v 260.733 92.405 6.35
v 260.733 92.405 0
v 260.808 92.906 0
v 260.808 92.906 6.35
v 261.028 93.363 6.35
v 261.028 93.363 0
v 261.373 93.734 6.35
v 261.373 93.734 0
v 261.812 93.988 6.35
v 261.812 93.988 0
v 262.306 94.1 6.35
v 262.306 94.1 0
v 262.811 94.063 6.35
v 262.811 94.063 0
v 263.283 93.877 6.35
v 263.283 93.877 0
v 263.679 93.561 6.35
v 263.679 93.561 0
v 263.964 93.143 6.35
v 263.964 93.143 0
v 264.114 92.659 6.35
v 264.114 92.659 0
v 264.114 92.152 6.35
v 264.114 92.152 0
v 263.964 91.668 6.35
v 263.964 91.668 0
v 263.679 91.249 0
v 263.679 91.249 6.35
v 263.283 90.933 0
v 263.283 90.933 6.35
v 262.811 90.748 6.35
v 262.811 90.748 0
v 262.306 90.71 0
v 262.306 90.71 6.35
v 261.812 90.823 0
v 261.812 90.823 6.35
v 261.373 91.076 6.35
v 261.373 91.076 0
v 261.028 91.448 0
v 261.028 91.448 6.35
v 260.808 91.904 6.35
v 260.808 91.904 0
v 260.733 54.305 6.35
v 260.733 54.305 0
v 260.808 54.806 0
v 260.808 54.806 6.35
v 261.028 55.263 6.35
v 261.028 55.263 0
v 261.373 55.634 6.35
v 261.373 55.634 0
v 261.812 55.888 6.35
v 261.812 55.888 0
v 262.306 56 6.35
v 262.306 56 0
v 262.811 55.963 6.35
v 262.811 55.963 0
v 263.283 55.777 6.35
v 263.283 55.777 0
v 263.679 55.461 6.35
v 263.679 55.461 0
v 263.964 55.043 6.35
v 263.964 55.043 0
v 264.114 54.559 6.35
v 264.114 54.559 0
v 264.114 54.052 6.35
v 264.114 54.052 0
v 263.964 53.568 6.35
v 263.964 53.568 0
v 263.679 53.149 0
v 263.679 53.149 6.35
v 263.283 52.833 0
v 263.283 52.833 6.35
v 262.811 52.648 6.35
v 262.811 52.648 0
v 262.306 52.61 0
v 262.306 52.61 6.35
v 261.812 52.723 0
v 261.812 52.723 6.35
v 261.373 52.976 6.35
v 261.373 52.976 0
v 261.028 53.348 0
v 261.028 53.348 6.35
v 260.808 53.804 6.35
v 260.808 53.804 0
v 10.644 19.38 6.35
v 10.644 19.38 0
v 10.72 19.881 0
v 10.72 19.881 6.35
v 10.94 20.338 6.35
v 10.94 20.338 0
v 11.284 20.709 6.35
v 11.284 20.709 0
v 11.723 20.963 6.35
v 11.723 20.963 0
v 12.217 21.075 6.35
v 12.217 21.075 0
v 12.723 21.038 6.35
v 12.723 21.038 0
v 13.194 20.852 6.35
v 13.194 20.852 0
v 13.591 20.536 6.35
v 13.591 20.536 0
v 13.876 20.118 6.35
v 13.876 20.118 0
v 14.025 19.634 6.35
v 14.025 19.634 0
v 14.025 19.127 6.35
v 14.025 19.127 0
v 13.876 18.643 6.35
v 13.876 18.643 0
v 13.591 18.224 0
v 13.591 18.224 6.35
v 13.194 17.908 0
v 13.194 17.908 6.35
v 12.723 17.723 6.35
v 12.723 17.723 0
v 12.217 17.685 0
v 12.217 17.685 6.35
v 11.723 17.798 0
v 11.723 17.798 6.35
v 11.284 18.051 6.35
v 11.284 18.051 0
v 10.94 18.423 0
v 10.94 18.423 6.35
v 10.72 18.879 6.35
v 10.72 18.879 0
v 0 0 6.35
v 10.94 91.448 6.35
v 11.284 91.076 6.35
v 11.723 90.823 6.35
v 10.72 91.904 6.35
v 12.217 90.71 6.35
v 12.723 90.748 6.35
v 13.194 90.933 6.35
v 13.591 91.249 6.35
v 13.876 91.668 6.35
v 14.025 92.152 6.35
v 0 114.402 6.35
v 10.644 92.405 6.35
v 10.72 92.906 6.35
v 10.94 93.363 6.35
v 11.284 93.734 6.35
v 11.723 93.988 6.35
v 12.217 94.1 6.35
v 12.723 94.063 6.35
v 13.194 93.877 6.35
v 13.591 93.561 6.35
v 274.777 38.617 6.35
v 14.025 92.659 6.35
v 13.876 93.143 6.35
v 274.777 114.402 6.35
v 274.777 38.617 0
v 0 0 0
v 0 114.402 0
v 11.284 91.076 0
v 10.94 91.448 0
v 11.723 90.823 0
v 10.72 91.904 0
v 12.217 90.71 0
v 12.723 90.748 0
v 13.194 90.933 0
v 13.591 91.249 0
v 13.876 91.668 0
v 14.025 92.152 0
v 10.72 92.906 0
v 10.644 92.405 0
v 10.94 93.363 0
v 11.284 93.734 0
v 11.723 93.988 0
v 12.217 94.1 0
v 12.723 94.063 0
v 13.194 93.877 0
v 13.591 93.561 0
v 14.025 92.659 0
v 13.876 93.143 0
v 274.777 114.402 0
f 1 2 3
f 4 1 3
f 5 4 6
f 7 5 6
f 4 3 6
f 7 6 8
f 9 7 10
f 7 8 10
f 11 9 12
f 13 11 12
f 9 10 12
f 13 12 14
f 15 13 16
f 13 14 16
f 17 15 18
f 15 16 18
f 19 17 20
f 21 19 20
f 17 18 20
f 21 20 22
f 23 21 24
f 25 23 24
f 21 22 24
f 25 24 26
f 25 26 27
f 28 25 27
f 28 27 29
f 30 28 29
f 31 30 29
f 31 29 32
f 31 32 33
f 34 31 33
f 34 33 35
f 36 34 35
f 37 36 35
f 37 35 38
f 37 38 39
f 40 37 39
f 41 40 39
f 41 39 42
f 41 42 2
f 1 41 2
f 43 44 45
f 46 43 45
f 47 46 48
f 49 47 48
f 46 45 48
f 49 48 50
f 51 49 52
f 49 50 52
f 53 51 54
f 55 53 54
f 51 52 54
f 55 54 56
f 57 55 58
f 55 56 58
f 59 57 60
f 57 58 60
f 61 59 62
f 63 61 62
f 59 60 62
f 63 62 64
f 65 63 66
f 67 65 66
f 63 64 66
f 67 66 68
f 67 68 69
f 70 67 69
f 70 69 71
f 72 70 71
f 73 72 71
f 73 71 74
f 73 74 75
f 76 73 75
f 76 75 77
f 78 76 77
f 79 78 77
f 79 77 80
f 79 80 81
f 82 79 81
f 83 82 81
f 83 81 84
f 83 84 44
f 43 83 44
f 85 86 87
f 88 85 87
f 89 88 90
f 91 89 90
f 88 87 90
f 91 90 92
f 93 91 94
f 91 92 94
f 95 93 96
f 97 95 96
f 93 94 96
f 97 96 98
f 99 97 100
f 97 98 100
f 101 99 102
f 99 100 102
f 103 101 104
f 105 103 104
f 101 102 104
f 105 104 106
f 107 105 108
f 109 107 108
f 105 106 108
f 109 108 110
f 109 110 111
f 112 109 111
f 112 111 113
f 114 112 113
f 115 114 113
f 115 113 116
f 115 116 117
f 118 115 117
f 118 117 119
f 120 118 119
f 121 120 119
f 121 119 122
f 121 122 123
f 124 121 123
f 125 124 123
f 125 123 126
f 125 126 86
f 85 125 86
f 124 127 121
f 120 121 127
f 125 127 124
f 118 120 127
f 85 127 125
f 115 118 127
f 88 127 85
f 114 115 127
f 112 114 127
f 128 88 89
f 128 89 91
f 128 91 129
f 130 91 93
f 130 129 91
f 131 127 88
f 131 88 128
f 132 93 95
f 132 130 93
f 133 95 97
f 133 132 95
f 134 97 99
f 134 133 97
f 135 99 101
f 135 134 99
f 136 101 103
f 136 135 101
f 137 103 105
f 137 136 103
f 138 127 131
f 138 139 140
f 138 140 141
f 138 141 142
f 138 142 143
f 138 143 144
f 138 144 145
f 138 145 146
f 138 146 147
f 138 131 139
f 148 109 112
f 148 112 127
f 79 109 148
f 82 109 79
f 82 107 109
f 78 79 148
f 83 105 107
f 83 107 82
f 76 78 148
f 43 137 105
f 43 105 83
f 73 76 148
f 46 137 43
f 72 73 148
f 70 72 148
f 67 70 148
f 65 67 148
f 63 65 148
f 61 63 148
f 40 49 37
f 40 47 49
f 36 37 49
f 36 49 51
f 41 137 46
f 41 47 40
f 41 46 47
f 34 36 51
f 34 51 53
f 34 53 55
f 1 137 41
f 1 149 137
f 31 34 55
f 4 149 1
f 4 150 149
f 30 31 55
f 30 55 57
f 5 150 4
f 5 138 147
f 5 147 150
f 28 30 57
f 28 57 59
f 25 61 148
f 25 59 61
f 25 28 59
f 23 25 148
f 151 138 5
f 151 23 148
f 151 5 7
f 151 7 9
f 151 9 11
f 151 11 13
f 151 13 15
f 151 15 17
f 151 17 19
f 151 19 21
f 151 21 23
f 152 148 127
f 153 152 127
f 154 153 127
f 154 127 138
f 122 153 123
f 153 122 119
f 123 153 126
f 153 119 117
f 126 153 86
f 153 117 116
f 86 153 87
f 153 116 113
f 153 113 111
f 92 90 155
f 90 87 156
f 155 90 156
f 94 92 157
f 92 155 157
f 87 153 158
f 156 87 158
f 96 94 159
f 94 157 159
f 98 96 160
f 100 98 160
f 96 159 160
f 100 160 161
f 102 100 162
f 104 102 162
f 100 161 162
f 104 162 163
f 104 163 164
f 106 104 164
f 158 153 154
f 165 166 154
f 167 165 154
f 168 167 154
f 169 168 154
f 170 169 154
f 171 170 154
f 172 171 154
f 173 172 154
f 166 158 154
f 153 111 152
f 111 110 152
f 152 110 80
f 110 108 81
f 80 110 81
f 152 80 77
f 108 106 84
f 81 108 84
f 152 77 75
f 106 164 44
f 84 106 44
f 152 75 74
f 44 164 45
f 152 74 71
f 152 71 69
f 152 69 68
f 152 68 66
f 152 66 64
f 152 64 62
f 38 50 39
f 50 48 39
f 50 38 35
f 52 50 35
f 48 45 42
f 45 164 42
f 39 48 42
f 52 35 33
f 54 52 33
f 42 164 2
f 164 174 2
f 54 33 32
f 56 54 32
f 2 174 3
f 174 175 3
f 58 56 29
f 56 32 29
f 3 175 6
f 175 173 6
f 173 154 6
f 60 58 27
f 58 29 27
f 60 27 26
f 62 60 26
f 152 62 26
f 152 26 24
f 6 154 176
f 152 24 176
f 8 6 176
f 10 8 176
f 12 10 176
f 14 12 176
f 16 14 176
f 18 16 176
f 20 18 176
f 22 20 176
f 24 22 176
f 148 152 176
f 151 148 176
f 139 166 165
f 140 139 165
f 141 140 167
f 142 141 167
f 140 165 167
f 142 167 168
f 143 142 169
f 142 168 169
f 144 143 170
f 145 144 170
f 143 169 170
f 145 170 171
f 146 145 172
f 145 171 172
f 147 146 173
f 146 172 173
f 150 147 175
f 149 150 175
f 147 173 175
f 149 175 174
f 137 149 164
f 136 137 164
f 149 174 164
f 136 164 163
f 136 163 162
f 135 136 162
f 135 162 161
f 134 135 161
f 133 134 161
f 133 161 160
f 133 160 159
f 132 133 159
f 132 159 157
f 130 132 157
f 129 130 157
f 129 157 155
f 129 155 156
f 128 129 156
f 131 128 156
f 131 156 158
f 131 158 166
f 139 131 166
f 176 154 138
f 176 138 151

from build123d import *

# Parameters (mm, degrees)
SKETCH1_W            = 274.7772
SKETCH1_H            = 114.4016
BOSS_EXTRUDE1_DEPTH  = 6.35
M3_CLEARANCE_HOLE1_D = 3.4
CUT_EXTRUDE2_DEPTH   = 298.708848075


with BuildPart() as part:
    # Sketch1 → Boss-Extrude1 (new body)
    with BuildSketch(Plane.XY):
        with Locations((137.3886, 57.2008)):
            Rectangle(SKETCH1_W, SKETCH1_H)
    extrude(amount=BOSS_EXTRUDE1_DEPTH)

    # M3 Clearance Hole1 (through all)
    with Locations(Plane.XY.offset(6.35)):
        with Locations((12.3444, 92.4052), (12.3444, 19.3802), (262.4328, 54.3052), (262.4328, 92.4052)):
            Hole(M3_CLEARANCE_HOLE1_D / 2)

    # Sketch5 → Cut-Extrude2 (cut, through all)
    with BuildSketch(Plane.XY.offset(6.35)):
        Polygon((0, 0), (274.7772, 0), (274.7772, 38.617417045), align=None)
    extrude(amount=-CUT_EXTRUDE2_DEPTH, mode=Mode.SUBTRACT)


solid = part.part
